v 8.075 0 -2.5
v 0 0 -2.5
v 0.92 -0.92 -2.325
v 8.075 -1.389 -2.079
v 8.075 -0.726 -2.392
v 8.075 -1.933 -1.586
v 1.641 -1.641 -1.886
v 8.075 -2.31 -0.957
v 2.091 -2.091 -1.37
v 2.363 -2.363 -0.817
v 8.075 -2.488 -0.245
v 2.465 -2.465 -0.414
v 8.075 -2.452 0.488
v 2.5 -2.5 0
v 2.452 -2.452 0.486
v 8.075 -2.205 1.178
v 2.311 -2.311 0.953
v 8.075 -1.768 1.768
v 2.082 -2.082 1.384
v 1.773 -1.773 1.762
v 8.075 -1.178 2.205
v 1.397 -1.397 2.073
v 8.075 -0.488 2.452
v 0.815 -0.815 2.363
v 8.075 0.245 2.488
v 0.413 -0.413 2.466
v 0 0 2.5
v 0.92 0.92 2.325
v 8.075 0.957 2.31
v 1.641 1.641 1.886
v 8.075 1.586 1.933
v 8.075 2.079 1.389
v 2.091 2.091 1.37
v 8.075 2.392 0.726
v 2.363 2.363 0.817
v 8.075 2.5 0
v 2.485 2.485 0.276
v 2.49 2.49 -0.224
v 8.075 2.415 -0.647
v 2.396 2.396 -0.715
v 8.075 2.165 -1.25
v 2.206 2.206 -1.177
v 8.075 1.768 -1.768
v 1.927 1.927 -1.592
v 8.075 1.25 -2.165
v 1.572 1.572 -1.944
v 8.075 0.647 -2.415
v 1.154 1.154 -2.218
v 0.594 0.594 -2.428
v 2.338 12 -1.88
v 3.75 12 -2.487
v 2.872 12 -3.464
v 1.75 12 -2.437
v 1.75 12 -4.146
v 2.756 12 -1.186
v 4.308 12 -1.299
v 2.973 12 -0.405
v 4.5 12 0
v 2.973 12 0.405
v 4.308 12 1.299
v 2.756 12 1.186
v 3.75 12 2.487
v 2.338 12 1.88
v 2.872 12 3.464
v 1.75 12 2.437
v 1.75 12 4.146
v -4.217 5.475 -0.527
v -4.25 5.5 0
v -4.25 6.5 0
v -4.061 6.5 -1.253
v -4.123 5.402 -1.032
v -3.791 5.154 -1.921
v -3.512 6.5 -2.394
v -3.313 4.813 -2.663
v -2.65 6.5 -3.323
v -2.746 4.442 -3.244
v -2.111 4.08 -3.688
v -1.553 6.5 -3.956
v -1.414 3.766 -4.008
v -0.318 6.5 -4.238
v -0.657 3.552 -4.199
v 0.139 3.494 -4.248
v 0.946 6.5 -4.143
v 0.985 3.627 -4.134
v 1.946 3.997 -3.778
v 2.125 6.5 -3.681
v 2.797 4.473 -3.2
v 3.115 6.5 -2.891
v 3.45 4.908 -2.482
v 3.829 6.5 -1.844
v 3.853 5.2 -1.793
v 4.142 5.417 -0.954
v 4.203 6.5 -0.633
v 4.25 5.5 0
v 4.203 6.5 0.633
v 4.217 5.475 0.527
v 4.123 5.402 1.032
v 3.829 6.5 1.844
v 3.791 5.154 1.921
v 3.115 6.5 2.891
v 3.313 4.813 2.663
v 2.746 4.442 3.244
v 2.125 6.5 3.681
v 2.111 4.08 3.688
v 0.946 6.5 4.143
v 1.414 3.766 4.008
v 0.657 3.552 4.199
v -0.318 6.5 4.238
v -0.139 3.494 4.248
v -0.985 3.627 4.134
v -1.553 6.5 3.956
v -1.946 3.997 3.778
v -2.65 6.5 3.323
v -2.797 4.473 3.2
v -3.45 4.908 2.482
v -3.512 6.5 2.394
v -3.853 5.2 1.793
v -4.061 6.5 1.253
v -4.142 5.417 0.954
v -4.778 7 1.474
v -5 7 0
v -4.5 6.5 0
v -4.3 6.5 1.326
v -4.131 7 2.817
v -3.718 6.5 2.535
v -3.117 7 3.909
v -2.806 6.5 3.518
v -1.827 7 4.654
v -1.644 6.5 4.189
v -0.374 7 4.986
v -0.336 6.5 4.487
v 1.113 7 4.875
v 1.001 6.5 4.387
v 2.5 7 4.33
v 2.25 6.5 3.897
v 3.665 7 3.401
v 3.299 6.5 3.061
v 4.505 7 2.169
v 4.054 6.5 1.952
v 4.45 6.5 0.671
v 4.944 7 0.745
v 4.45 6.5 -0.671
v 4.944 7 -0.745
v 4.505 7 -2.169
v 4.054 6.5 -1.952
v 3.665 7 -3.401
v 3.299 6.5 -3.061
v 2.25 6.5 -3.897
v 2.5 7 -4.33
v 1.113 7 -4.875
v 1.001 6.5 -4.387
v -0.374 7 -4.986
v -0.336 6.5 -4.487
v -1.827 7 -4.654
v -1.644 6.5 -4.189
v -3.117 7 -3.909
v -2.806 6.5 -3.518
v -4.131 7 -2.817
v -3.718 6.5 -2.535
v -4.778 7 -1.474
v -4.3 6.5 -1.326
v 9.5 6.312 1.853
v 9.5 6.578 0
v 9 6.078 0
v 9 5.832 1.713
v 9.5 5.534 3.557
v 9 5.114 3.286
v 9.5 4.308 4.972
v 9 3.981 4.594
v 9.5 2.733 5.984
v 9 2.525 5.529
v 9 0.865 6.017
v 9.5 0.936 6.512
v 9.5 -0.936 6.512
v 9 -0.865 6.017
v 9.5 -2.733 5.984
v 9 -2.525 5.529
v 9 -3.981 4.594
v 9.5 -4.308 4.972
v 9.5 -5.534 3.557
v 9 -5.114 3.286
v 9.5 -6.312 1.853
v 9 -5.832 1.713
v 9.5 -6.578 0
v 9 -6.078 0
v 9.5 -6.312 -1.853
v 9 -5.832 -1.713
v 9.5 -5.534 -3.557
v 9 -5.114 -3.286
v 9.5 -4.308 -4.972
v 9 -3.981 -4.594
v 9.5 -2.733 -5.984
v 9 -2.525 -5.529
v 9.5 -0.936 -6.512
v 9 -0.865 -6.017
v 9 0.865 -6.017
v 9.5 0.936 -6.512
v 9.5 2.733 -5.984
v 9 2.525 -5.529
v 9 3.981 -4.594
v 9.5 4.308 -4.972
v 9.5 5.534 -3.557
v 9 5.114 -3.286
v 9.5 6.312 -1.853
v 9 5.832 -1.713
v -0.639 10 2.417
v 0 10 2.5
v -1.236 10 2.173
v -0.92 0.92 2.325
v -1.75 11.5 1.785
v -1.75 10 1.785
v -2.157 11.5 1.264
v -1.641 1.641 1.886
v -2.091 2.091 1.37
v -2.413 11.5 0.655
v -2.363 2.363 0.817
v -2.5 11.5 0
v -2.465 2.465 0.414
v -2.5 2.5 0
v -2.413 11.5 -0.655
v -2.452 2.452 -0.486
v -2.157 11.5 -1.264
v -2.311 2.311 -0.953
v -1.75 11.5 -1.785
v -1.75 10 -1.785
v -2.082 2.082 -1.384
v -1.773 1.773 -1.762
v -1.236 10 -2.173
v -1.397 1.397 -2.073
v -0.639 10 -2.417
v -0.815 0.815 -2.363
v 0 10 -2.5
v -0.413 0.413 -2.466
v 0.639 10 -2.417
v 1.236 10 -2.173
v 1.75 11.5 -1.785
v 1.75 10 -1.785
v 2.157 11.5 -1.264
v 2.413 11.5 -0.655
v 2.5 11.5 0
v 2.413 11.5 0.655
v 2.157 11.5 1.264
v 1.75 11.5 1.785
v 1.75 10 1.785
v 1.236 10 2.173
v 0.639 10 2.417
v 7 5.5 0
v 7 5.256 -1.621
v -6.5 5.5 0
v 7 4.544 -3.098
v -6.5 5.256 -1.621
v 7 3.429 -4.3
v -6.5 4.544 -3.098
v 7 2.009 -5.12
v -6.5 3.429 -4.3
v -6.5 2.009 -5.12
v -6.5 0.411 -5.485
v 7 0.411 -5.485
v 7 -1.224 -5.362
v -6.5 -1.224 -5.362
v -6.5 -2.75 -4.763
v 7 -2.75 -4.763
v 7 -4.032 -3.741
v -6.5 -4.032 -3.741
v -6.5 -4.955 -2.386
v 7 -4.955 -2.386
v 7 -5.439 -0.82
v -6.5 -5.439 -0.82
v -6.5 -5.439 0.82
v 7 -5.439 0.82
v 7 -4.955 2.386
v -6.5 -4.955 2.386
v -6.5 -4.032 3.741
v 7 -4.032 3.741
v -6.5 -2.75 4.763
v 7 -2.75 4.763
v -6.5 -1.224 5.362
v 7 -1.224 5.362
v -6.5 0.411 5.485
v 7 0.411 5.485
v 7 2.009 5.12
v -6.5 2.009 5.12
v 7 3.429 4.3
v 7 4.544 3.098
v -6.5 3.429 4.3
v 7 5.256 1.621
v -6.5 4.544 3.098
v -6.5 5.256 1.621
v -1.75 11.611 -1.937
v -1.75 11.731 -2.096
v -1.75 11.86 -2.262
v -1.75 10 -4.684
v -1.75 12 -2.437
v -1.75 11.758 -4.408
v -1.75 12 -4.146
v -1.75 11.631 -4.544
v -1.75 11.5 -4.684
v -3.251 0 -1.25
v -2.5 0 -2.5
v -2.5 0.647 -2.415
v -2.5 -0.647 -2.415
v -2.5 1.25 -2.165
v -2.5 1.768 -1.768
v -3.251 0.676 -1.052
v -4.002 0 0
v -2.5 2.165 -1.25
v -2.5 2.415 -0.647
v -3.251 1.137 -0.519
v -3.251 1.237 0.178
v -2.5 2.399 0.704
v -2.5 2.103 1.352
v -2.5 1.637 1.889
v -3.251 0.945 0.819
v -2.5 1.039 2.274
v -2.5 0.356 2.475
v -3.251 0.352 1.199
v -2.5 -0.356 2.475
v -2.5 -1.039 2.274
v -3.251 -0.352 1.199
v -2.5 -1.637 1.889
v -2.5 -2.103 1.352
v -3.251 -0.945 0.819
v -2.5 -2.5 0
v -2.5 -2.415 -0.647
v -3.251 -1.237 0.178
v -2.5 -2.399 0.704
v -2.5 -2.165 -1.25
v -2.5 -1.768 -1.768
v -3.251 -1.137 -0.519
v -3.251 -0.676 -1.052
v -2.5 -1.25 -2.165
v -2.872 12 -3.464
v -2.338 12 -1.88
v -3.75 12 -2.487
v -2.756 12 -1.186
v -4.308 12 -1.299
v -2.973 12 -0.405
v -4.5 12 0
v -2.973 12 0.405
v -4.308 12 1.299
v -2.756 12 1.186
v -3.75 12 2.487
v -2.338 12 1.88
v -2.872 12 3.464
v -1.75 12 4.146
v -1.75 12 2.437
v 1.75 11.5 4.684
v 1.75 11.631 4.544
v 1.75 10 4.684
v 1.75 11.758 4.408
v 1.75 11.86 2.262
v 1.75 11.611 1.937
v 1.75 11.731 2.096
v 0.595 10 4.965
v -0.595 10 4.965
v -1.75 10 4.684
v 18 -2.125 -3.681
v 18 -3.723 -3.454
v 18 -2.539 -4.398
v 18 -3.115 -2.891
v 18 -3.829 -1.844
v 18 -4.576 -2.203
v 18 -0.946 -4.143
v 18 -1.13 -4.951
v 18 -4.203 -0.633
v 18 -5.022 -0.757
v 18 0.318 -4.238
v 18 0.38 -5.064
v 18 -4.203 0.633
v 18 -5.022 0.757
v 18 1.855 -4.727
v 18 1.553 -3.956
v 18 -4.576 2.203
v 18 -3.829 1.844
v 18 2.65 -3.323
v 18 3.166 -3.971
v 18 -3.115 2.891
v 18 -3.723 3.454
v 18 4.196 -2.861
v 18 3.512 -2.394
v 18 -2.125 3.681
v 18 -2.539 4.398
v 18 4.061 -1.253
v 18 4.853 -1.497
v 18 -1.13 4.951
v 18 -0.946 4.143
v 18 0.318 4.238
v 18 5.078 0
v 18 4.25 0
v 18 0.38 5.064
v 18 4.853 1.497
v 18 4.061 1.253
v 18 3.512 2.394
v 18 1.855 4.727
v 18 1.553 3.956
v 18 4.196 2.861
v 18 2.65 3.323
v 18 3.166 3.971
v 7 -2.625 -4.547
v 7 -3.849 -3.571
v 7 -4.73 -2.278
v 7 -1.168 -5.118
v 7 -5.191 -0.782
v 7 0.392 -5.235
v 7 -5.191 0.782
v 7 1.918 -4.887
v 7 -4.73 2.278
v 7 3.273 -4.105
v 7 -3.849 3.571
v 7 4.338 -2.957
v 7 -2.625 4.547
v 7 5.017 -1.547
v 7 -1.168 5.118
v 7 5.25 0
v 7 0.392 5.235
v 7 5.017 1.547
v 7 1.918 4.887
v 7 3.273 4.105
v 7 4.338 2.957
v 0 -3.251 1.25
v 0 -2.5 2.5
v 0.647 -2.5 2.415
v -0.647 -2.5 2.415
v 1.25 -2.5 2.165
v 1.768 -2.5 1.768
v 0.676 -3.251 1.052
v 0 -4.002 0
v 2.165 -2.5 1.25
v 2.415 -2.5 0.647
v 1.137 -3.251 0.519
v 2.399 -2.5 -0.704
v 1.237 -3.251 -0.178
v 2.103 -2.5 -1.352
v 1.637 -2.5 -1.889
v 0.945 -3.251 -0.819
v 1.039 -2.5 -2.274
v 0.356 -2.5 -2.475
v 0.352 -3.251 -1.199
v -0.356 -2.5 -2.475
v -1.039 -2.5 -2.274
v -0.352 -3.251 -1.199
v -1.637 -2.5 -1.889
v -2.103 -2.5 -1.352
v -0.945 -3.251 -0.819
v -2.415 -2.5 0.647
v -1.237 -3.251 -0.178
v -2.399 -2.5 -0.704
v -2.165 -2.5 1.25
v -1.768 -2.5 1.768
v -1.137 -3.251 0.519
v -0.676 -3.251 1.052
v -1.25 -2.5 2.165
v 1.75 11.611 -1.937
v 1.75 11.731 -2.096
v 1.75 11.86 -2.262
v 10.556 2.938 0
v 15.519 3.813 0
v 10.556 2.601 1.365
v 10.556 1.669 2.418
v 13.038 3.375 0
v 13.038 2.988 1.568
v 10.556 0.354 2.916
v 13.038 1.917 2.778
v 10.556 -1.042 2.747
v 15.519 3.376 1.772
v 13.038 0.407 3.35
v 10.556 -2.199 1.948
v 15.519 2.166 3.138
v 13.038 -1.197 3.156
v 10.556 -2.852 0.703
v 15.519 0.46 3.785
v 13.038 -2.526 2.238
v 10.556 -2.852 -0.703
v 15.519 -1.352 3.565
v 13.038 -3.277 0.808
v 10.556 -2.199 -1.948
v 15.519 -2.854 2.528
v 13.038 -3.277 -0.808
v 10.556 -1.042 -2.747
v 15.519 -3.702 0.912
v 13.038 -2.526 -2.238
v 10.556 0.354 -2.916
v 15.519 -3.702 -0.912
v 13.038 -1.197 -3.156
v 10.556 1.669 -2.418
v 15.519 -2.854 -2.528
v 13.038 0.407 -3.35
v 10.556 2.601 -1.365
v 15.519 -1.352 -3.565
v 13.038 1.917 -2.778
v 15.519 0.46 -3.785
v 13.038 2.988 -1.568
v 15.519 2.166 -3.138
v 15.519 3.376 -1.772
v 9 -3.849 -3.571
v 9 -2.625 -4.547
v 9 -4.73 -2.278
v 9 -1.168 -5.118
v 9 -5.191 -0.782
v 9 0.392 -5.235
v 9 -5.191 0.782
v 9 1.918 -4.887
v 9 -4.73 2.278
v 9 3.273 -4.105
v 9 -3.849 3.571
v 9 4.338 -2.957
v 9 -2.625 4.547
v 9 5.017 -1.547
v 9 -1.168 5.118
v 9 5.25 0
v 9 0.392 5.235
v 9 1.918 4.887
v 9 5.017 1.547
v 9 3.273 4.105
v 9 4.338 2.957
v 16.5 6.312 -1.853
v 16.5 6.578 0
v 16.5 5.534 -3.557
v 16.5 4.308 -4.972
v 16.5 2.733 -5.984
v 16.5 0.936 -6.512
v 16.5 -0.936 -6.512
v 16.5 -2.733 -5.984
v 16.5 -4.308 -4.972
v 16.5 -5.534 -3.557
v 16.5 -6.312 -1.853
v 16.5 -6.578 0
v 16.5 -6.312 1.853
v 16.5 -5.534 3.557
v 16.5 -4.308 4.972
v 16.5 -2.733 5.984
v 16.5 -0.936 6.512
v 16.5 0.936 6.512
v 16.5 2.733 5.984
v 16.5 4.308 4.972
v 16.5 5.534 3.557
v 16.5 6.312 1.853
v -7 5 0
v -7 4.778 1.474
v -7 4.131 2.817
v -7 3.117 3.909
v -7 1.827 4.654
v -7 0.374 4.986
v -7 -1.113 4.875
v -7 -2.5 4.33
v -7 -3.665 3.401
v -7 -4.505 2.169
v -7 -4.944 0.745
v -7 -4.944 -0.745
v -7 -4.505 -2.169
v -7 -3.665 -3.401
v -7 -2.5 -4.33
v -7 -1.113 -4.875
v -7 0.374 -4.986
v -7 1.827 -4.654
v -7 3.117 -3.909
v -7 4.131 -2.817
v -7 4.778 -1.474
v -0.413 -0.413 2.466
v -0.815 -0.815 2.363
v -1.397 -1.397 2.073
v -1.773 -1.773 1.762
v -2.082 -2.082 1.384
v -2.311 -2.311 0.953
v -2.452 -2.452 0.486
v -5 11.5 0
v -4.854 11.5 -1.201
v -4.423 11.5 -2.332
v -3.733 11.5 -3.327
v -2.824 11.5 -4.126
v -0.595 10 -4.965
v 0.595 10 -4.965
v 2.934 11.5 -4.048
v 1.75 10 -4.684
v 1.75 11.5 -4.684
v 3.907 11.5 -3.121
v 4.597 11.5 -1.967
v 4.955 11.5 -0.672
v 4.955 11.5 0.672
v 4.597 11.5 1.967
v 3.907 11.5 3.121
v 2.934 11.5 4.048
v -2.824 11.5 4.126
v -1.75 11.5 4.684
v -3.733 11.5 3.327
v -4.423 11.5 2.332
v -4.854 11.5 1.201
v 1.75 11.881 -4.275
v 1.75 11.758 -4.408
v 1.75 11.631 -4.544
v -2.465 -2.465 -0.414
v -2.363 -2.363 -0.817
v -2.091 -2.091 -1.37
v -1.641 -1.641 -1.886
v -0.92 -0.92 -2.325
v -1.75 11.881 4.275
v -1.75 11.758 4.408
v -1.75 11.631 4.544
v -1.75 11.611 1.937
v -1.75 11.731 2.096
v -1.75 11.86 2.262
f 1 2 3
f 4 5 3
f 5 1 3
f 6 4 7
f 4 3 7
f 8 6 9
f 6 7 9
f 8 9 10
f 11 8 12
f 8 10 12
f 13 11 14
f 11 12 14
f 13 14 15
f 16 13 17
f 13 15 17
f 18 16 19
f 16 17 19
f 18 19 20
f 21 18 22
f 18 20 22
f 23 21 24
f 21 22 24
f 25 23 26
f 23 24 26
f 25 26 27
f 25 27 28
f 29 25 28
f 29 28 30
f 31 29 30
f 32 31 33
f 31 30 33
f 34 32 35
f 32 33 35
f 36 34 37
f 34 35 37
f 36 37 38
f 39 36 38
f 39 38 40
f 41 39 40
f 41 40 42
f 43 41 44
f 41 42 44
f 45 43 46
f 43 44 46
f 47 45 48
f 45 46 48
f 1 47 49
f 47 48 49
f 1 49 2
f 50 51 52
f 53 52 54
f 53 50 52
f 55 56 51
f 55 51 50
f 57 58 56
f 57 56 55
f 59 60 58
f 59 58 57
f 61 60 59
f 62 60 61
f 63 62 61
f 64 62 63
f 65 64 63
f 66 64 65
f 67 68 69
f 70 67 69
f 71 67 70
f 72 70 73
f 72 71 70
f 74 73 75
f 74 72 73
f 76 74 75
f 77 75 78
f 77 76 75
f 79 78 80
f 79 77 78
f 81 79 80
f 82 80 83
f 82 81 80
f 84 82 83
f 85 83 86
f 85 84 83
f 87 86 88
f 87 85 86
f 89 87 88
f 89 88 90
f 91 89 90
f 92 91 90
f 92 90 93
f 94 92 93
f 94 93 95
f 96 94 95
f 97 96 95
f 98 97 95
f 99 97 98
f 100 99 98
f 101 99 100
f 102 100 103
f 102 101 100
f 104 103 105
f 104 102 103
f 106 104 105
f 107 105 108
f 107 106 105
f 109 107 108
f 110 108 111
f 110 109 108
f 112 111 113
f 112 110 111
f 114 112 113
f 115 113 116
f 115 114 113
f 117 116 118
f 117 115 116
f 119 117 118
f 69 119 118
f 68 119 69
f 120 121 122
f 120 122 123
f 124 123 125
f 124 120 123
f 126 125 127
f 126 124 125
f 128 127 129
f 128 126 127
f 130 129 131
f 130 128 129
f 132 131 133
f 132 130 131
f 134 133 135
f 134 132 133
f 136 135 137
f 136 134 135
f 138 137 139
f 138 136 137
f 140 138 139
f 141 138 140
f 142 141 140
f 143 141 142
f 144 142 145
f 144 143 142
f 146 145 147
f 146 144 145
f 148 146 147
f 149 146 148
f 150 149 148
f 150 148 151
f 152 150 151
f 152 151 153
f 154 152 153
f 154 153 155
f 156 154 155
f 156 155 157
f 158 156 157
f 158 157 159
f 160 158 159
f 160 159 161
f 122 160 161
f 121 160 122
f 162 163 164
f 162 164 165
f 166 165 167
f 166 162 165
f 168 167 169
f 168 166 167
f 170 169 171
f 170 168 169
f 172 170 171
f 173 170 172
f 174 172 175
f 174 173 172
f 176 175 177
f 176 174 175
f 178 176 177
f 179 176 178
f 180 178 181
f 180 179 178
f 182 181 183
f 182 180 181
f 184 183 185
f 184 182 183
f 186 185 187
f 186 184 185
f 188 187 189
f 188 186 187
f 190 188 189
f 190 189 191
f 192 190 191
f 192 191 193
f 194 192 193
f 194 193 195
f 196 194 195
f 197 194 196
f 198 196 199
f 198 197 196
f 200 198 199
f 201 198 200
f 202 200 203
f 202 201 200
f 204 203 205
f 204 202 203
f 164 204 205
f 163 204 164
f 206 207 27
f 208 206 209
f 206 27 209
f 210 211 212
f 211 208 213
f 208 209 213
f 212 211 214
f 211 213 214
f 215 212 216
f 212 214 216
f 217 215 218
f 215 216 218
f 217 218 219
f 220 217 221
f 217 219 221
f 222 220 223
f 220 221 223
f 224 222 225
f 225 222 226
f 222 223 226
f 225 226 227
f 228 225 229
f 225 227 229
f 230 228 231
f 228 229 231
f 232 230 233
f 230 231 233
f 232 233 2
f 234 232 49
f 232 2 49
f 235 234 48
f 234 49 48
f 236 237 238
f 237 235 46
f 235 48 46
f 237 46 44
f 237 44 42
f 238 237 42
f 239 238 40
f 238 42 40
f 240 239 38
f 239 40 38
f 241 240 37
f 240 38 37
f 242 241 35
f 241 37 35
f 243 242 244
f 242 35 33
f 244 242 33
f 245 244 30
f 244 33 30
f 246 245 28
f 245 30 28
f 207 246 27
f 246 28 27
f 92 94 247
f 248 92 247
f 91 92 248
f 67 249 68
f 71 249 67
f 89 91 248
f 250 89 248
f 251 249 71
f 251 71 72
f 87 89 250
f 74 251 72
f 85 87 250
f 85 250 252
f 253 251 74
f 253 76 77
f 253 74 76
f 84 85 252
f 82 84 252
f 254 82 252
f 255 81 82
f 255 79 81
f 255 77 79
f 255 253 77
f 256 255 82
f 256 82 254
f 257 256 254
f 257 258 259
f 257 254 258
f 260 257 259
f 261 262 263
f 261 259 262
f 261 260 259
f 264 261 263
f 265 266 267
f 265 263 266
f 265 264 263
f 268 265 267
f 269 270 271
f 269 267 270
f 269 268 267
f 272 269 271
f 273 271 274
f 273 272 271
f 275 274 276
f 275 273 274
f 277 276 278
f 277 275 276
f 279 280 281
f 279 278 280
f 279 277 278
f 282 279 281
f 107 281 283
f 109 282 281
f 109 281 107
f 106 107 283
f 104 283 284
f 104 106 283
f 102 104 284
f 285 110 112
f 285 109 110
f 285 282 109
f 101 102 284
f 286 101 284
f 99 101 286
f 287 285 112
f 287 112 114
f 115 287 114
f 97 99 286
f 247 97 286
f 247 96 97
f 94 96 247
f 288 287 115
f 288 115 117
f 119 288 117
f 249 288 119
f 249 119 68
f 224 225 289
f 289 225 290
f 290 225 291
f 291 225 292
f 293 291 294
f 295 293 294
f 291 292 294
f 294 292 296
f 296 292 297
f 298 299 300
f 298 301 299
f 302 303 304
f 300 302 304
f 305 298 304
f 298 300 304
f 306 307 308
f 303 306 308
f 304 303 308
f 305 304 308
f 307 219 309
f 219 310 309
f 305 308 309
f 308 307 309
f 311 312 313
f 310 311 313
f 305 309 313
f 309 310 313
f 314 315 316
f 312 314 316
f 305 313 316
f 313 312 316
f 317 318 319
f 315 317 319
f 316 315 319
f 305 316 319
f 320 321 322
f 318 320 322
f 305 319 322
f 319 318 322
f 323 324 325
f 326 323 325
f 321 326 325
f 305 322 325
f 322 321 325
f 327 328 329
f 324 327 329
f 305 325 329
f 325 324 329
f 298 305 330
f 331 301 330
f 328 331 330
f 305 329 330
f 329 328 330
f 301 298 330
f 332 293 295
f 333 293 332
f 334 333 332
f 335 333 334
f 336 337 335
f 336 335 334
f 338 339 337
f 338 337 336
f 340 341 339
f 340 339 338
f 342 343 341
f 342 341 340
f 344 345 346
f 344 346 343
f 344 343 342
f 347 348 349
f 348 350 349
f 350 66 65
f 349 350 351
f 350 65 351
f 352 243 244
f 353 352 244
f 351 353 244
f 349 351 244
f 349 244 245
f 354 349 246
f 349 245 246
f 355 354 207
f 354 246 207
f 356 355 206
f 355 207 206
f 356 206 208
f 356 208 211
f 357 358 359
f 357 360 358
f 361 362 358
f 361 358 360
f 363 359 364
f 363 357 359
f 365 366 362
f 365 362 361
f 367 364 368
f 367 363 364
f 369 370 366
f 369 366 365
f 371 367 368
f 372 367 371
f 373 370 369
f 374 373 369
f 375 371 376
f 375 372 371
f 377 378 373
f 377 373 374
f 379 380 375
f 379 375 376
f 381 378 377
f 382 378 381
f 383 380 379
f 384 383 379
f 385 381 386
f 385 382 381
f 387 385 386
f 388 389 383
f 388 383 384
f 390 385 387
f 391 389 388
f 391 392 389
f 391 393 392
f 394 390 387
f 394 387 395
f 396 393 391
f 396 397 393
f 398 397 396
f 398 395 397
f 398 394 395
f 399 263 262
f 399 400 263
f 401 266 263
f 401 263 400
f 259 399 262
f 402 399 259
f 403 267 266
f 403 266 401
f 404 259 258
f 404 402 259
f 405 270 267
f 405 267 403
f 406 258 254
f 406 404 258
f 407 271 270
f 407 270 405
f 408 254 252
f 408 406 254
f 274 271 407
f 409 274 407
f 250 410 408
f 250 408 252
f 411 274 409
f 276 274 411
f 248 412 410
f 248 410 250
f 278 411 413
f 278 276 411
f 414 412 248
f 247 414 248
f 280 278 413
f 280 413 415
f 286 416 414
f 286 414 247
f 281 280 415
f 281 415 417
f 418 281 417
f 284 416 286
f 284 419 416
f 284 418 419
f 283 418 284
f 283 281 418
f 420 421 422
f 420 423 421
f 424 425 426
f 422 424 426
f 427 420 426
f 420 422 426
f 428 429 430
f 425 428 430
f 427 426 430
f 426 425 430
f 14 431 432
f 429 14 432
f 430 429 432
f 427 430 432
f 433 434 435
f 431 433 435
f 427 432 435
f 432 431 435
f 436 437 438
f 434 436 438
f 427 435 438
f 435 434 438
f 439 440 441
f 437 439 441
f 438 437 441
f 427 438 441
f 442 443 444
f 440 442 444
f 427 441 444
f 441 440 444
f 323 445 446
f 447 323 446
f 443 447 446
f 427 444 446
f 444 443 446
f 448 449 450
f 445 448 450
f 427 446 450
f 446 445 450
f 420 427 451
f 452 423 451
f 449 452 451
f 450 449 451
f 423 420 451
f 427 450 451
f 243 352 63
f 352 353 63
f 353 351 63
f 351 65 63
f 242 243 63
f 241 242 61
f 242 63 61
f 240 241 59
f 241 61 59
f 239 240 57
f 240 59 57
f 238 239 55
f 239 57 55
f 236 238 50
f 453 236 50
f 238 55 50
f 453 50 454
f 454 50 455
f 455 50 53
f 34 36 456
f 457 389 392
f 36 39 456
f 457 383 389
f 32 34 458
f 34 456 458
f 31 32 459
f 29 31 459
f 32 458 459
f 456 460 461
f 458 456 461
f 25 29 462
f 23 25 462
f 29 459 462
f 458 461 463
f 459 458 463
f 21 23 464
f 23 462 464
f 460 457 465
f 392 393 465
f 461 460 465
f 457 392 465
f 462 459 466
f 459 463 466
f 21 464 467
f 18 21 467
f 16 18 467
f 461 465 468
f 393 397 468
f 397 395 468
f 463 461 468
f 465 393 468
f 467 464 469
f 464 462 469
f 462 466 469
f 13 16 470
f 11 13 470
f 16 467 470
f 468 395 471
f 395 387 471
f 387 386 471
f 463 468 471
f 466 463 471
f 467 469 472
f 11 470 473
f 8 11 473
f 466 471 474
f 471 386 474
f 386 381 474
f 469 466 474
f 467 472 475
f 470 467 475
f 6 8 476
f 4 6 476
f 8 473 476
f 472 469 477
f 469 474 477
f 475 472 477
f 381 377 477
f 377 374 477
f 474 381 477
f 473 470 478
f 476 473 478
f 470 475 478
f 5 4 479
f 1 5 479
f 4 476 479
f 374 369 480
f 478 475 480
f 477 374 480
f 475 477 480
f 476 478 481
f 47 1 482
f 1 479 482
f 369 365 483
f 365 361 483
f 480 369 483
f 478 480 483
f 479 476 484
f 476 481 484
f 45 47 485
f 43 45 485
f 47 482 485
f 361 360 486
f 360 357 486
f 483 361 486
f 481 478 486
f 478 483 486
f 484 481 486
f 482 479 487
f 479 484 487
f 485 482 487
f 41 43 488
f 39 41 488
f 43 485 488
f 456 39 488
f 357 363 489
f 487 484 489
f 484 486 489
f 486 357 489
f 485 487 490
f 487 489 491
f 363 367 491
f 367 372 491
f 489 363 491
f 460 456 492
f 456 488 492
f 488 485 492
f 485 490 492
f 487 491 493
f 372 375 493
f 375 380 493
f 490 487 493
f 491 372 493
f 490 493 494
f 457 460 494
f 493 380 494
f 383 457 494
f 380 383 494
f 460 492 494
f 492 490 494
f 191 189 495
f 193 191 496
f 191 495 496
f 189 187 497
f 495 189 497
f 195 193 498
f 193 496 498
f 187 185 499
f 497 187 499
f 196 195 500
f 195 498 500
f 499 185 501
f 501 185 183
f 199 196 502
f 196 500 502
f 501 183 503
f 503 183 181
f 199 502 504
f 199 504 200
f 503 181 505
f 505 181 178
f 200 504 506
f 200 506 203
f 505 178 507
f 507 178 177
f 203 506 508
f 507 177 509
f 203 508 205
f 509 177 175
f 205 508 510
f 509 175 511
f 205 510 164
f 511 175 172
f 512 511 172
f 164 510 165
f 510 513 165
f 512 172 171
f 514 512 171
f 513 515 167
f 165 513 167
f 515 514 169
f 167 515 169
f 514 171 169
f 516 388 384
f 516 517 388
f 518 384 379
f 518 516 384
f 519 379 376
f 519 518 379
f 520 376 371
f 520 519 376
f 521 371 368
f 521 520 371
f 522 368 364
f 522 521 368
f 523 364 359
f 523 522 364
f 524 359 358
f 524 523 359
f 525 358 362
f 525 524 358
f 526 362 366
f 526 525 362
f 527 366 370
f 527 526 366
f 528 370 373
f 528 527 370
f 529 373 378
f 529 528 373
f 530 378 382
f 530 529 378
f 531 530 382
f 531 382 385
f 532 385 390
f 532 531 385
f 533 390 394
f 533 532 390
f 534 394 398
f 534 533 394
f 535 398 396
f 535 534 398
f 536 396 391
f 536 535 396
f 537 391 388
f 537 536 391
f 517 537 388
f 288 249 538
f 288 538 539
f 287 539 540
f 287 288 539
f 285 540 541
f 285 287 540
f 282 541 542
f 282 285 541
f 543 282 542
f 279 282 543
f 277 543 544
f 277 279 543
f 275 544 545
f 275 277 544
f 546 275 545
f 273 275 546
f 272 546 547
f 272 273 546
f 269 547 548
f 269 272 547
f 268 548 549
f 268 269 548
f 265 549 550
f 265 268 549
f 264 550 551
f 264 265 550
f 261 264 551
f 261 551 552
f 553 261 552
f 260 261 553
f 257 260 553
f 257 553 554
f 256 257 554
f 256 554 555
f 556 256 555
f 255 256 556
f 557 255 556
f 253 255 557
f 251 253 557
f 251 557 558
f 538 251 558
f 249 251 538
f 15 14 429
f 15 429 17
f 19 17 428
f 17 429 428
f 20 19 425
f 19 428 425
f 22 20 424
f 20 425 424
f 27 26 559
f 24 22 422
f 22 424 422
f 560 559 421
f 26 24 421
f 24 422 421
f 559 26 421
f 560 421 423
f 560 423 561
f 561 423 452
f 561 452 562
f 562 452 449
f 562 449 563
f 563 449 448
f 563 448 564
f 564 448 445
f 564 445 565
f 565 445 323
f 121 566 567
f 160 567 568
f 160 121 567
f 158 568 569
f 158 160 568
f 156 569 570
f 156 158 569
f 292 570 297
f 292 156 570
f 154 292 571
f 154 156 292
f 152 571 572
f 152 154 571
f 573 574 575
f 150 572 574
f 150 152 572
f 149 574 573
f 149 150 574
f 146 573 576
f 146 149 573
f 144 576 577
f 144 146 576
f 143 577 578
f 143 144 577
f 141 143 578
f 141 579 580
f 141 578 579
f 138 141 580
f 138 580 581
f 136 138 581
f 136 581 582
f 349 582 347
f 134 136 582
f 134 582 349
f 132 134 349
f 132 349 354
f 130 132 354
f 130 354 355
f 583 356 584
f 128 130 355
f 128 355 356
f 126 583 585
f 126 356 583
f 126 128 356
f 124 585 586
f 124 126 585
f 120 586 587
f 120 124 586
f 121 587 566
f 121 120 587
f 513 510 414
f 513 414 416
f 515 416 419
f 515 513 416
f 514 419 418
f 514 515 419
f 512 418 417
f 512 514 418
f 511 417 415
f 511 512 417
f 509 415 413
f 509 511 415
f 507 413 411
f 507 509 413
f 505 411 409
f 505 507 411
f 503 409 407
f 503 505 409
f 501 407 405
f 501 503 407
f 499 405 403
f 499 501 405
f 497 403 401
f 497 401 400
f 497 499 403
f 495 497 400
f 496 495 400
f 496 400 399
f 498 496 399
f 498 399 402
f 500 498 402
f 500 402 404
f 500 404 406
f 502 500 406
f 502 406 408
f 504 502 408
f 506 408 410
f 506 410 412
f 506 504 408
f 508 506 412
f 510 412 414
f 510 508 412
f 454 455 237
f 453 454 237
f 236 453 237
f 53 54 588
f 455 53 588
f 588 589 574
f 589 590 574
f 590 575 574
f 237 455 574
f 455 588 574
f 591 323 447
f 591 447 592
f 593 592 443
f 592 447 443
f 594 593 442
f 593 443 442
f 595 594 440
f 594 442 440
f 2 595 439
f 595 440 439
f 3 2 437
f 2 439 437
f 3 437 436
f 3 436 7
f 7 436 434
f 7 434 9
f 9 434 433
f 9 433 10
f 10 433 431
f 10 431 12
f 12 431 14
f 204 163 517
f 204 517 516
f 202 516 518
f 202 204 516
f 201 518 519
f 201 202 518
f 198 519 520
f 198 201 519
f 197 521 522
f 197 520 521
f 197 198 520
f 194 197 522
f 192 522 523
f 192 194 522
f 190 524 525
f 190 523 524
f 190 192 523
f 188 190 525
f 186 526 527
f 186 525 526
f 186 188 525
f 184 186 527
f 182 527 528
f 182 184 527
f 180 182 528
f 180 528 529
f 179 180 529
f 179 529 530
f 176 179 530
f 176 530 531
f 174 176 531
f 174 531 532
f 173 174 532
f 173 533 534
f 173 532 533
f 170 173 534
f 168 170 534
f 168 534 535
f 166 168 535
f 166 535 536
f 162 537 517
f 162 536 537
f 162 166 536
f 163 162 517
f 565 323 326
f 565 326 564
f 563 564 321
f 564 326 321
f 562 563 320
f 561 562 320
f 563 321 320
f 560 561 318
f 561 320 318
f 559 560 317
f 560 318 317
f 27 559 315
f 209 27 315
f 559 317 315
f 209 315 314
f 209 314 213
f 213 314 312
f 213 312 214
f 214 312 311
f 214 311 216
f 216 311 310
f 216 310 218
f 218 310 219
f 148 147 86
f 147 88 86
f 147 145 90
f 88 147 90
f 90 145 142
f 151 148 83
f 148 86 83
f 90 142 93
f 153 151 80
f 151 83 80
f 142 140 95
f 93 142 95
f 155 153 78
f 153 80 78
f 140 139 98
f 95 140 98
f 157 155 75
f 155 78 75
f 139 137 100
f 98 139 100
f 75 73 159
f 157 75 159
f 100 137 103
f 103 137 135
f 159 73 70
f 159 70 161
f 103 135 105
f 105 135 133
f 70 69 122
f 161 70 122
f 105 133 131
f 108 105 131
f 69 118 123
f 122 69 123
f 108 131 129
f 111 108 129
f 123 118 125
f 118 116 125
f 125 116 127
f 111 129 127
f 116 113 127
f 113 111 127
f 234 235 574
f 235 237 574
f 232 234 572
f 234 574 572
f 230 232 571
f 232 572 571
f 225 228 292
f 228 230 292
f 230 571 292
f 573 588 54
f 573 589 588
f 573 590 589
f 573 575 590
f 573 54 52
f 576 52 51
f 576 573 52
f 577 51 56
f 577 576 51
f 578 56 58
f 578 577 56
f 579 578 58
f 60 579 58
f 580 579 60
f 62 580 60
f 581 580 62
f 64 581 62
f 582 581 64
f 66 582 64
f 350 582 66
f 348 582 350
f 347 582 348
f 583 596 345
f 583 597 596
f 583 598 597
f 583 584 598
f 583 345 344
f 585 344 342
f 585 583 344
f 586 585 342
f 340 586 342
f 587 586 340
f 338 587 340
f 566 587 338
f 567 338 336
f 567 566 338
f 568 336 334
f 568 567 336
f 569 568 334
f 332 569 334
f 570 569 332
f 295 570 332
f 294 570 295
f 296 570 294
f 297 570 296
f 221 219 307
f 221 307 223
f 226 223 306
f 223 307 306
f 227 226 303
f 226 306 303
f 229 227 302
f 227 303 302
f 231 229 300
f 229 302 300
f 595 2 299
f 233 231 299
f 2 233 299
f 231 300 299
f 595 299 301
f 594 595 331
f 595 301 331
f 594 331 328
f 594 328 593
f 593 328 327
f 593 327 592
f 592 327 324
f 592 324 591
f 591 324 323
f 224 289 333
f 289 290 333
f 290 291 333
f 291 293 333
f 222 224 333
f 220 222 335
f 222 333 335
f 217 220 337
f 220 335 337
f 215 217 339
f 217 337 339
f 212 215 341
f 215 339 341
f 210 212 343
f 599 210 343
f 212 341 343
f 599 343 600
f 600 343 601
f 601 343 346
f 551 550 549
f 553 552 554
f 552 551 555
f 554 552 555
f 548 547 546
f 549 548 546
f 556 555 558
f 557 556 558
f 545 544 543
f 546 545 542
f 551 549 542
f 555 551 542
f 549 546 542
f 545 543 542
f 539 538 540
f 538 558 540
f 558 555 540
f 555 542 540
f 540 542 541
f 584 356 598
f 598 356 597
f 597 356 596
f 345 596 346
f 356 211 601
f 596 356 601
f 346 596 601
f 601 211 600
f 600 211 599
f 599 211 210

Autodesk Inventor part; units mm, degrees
ref_plane "YZ Plane" through (0, 0, 0) normal (1, 0, 0) x (0, 1, 0)
ref_plane "XZ Plane" through (0, 0, 0) normal (0, 1, 0) x (-1, 0, 0)
ref_plane "XY Plane" through (0, 0, 0) normal (0, 0, 1) x (1, 0, 0)
sketch "Sketch1" plane through (0, 0, 0) normal (0, 0, 1) x (1, 0, 0)
  line L0 (18, 0) -> (18, 6.5785)
  line L1 (18, 6.5785) -> (9, 6.5785)
  line L2 (9, 6.5785) -> (9, 5.25)
  line L3 (7, 5.5) -> (-7, 5.5)
  line L4 (-7, 5.5) -> (-7, 0)
  line L5 (-7, 0) -> (18, 0)
  line L6 (7, 5.5) -> (7, 5.25)
  line L7 (7, 5.25) -> (9, 5.25)
  point P0 (0, 0)
  dimension "d0" = 25
  dimension "d1" = 18
  dimension "d2" = 11
  dimension "d3" = 10.5
  dimension "d4" = 9
  dimension "d5" = 2
  dimension "d13" = 13.157
revolve "Revolution1" add sketch "Sketch1" angle 360 about axis through (-7, 0, 0) along (1, 0, 0)
chamfer "Chamfer1" distance 1.5 angle 45 1 edges at (18, -6.5785, 0)
chamfer "Chamfer2" distance 0.5 angle 45 1 edges at (9, -6.5785, 0)
thread "Thread1" size "G13.157x1.337" designation "G 1/4" class "A" standard "ISO Pipe Threads" full length
sketch "Sketch2" plane through (0, 0, 0) normal (0, 0, 1) x (1, 0, 0)
  line L0 (0, 12) -> (-5, 12)
  line L1 (-5, 12) -> (-5, 6.5)
  line L2 (-5, 6.5) -> (-4.25, 6.5)
  line L3 (-4.25, 6.5) -> (-4.25, 0)
  line L4 (-4.25, 0) -> (0, 0)
  line L5 (0, 0) -> (0, 12)
  dimension "d16" = 12
  dimension "d17" = 10
  dimension "d18" = 8.5
  dimension "d19" = 5.5
revolve "Revolution2" add sketch "Sketch2" angle 360 about axis through (0, 0, 0) along (0, 1, 0)
chamfer "Chamfer3" distance 0.5 angle 45 3 edges at (5, 12, 0) (5, 6.5, 0) (-7, -5.5, 0)
sketch "Sketch3" plane through (0, 0, 0) normal (0, 0, 1) x (1, 0, 0)
  line L0 (18, 5.0785) -> (18, -5.0785) projected
  line L1 (18, 0) -> (18, 4.25)
  line L2 (18, 4.25) -> (8.0753, 2.5)
  line L3 (8.0753, 2.5) -> (8.0753, 0)
  line L4 (8.0753, 0) -> (18, 0)
  point P0 (0, 0)
  dimension "d24" = 8.5
  dimension "d25" = 10
  dimension "d26" = 5
revolve "Revolution3" cut sketch "Sketch3" angle 360 about axis through (8.0753, 0, 0) along (1, 0, 0)
sketch "Sketch4" plane through (18, 0, 0) normal (1, 0, 0) x (0, 0, -1)
  circle A0 centre (0, 0) radius 4.25 projected
  point P0 (0, 0)
  point P1 (0, 0)
hole "Hole1" at (18, 0, 0) direction (-1, 0, 0) diameter 5 depth 20.5 tip angle 118
sketch "Sketch5" plane through (0, 12, 0) normal (0, 1, 0) x (1, 0, 0)
  circle A0 centre (0, 0) radius 4.5 projected
hole "Hole2" at (0, 12, 0) direction (0, -1, 0) diameter 5 depth 14.5 tip angle 118
chamfer "Chamfer4" distance 0.5 angle 45 1 edges at (0, 12, -2.5)
sketch "Sketch6" plane through (0, 0, 0) normal (0, 0, 1) x (1, 0, 0)
  line L0 (-4.5, 12) -> (4.5, 12) projected
  line L1 (-1.75, 12) -> (1.75, 12)
  line L2 (1.75, 12) -> (1.75, 10)
  line L3 (1.75, 10) -> (-1.75, 10)
  line L4 (-1.75, 10) -> (-1.75, 12)
  point P0 (0, 0)
  point P1 (0, 10)
  dimension "d45" = 2
  dimension "d46" = 3.5
extrude "Extrusion1" cut sketch "Sketch6" along normal through all both and the other way through all
properties part number "Part020. Hydraulic elbow" material "Steel, Carbon"
